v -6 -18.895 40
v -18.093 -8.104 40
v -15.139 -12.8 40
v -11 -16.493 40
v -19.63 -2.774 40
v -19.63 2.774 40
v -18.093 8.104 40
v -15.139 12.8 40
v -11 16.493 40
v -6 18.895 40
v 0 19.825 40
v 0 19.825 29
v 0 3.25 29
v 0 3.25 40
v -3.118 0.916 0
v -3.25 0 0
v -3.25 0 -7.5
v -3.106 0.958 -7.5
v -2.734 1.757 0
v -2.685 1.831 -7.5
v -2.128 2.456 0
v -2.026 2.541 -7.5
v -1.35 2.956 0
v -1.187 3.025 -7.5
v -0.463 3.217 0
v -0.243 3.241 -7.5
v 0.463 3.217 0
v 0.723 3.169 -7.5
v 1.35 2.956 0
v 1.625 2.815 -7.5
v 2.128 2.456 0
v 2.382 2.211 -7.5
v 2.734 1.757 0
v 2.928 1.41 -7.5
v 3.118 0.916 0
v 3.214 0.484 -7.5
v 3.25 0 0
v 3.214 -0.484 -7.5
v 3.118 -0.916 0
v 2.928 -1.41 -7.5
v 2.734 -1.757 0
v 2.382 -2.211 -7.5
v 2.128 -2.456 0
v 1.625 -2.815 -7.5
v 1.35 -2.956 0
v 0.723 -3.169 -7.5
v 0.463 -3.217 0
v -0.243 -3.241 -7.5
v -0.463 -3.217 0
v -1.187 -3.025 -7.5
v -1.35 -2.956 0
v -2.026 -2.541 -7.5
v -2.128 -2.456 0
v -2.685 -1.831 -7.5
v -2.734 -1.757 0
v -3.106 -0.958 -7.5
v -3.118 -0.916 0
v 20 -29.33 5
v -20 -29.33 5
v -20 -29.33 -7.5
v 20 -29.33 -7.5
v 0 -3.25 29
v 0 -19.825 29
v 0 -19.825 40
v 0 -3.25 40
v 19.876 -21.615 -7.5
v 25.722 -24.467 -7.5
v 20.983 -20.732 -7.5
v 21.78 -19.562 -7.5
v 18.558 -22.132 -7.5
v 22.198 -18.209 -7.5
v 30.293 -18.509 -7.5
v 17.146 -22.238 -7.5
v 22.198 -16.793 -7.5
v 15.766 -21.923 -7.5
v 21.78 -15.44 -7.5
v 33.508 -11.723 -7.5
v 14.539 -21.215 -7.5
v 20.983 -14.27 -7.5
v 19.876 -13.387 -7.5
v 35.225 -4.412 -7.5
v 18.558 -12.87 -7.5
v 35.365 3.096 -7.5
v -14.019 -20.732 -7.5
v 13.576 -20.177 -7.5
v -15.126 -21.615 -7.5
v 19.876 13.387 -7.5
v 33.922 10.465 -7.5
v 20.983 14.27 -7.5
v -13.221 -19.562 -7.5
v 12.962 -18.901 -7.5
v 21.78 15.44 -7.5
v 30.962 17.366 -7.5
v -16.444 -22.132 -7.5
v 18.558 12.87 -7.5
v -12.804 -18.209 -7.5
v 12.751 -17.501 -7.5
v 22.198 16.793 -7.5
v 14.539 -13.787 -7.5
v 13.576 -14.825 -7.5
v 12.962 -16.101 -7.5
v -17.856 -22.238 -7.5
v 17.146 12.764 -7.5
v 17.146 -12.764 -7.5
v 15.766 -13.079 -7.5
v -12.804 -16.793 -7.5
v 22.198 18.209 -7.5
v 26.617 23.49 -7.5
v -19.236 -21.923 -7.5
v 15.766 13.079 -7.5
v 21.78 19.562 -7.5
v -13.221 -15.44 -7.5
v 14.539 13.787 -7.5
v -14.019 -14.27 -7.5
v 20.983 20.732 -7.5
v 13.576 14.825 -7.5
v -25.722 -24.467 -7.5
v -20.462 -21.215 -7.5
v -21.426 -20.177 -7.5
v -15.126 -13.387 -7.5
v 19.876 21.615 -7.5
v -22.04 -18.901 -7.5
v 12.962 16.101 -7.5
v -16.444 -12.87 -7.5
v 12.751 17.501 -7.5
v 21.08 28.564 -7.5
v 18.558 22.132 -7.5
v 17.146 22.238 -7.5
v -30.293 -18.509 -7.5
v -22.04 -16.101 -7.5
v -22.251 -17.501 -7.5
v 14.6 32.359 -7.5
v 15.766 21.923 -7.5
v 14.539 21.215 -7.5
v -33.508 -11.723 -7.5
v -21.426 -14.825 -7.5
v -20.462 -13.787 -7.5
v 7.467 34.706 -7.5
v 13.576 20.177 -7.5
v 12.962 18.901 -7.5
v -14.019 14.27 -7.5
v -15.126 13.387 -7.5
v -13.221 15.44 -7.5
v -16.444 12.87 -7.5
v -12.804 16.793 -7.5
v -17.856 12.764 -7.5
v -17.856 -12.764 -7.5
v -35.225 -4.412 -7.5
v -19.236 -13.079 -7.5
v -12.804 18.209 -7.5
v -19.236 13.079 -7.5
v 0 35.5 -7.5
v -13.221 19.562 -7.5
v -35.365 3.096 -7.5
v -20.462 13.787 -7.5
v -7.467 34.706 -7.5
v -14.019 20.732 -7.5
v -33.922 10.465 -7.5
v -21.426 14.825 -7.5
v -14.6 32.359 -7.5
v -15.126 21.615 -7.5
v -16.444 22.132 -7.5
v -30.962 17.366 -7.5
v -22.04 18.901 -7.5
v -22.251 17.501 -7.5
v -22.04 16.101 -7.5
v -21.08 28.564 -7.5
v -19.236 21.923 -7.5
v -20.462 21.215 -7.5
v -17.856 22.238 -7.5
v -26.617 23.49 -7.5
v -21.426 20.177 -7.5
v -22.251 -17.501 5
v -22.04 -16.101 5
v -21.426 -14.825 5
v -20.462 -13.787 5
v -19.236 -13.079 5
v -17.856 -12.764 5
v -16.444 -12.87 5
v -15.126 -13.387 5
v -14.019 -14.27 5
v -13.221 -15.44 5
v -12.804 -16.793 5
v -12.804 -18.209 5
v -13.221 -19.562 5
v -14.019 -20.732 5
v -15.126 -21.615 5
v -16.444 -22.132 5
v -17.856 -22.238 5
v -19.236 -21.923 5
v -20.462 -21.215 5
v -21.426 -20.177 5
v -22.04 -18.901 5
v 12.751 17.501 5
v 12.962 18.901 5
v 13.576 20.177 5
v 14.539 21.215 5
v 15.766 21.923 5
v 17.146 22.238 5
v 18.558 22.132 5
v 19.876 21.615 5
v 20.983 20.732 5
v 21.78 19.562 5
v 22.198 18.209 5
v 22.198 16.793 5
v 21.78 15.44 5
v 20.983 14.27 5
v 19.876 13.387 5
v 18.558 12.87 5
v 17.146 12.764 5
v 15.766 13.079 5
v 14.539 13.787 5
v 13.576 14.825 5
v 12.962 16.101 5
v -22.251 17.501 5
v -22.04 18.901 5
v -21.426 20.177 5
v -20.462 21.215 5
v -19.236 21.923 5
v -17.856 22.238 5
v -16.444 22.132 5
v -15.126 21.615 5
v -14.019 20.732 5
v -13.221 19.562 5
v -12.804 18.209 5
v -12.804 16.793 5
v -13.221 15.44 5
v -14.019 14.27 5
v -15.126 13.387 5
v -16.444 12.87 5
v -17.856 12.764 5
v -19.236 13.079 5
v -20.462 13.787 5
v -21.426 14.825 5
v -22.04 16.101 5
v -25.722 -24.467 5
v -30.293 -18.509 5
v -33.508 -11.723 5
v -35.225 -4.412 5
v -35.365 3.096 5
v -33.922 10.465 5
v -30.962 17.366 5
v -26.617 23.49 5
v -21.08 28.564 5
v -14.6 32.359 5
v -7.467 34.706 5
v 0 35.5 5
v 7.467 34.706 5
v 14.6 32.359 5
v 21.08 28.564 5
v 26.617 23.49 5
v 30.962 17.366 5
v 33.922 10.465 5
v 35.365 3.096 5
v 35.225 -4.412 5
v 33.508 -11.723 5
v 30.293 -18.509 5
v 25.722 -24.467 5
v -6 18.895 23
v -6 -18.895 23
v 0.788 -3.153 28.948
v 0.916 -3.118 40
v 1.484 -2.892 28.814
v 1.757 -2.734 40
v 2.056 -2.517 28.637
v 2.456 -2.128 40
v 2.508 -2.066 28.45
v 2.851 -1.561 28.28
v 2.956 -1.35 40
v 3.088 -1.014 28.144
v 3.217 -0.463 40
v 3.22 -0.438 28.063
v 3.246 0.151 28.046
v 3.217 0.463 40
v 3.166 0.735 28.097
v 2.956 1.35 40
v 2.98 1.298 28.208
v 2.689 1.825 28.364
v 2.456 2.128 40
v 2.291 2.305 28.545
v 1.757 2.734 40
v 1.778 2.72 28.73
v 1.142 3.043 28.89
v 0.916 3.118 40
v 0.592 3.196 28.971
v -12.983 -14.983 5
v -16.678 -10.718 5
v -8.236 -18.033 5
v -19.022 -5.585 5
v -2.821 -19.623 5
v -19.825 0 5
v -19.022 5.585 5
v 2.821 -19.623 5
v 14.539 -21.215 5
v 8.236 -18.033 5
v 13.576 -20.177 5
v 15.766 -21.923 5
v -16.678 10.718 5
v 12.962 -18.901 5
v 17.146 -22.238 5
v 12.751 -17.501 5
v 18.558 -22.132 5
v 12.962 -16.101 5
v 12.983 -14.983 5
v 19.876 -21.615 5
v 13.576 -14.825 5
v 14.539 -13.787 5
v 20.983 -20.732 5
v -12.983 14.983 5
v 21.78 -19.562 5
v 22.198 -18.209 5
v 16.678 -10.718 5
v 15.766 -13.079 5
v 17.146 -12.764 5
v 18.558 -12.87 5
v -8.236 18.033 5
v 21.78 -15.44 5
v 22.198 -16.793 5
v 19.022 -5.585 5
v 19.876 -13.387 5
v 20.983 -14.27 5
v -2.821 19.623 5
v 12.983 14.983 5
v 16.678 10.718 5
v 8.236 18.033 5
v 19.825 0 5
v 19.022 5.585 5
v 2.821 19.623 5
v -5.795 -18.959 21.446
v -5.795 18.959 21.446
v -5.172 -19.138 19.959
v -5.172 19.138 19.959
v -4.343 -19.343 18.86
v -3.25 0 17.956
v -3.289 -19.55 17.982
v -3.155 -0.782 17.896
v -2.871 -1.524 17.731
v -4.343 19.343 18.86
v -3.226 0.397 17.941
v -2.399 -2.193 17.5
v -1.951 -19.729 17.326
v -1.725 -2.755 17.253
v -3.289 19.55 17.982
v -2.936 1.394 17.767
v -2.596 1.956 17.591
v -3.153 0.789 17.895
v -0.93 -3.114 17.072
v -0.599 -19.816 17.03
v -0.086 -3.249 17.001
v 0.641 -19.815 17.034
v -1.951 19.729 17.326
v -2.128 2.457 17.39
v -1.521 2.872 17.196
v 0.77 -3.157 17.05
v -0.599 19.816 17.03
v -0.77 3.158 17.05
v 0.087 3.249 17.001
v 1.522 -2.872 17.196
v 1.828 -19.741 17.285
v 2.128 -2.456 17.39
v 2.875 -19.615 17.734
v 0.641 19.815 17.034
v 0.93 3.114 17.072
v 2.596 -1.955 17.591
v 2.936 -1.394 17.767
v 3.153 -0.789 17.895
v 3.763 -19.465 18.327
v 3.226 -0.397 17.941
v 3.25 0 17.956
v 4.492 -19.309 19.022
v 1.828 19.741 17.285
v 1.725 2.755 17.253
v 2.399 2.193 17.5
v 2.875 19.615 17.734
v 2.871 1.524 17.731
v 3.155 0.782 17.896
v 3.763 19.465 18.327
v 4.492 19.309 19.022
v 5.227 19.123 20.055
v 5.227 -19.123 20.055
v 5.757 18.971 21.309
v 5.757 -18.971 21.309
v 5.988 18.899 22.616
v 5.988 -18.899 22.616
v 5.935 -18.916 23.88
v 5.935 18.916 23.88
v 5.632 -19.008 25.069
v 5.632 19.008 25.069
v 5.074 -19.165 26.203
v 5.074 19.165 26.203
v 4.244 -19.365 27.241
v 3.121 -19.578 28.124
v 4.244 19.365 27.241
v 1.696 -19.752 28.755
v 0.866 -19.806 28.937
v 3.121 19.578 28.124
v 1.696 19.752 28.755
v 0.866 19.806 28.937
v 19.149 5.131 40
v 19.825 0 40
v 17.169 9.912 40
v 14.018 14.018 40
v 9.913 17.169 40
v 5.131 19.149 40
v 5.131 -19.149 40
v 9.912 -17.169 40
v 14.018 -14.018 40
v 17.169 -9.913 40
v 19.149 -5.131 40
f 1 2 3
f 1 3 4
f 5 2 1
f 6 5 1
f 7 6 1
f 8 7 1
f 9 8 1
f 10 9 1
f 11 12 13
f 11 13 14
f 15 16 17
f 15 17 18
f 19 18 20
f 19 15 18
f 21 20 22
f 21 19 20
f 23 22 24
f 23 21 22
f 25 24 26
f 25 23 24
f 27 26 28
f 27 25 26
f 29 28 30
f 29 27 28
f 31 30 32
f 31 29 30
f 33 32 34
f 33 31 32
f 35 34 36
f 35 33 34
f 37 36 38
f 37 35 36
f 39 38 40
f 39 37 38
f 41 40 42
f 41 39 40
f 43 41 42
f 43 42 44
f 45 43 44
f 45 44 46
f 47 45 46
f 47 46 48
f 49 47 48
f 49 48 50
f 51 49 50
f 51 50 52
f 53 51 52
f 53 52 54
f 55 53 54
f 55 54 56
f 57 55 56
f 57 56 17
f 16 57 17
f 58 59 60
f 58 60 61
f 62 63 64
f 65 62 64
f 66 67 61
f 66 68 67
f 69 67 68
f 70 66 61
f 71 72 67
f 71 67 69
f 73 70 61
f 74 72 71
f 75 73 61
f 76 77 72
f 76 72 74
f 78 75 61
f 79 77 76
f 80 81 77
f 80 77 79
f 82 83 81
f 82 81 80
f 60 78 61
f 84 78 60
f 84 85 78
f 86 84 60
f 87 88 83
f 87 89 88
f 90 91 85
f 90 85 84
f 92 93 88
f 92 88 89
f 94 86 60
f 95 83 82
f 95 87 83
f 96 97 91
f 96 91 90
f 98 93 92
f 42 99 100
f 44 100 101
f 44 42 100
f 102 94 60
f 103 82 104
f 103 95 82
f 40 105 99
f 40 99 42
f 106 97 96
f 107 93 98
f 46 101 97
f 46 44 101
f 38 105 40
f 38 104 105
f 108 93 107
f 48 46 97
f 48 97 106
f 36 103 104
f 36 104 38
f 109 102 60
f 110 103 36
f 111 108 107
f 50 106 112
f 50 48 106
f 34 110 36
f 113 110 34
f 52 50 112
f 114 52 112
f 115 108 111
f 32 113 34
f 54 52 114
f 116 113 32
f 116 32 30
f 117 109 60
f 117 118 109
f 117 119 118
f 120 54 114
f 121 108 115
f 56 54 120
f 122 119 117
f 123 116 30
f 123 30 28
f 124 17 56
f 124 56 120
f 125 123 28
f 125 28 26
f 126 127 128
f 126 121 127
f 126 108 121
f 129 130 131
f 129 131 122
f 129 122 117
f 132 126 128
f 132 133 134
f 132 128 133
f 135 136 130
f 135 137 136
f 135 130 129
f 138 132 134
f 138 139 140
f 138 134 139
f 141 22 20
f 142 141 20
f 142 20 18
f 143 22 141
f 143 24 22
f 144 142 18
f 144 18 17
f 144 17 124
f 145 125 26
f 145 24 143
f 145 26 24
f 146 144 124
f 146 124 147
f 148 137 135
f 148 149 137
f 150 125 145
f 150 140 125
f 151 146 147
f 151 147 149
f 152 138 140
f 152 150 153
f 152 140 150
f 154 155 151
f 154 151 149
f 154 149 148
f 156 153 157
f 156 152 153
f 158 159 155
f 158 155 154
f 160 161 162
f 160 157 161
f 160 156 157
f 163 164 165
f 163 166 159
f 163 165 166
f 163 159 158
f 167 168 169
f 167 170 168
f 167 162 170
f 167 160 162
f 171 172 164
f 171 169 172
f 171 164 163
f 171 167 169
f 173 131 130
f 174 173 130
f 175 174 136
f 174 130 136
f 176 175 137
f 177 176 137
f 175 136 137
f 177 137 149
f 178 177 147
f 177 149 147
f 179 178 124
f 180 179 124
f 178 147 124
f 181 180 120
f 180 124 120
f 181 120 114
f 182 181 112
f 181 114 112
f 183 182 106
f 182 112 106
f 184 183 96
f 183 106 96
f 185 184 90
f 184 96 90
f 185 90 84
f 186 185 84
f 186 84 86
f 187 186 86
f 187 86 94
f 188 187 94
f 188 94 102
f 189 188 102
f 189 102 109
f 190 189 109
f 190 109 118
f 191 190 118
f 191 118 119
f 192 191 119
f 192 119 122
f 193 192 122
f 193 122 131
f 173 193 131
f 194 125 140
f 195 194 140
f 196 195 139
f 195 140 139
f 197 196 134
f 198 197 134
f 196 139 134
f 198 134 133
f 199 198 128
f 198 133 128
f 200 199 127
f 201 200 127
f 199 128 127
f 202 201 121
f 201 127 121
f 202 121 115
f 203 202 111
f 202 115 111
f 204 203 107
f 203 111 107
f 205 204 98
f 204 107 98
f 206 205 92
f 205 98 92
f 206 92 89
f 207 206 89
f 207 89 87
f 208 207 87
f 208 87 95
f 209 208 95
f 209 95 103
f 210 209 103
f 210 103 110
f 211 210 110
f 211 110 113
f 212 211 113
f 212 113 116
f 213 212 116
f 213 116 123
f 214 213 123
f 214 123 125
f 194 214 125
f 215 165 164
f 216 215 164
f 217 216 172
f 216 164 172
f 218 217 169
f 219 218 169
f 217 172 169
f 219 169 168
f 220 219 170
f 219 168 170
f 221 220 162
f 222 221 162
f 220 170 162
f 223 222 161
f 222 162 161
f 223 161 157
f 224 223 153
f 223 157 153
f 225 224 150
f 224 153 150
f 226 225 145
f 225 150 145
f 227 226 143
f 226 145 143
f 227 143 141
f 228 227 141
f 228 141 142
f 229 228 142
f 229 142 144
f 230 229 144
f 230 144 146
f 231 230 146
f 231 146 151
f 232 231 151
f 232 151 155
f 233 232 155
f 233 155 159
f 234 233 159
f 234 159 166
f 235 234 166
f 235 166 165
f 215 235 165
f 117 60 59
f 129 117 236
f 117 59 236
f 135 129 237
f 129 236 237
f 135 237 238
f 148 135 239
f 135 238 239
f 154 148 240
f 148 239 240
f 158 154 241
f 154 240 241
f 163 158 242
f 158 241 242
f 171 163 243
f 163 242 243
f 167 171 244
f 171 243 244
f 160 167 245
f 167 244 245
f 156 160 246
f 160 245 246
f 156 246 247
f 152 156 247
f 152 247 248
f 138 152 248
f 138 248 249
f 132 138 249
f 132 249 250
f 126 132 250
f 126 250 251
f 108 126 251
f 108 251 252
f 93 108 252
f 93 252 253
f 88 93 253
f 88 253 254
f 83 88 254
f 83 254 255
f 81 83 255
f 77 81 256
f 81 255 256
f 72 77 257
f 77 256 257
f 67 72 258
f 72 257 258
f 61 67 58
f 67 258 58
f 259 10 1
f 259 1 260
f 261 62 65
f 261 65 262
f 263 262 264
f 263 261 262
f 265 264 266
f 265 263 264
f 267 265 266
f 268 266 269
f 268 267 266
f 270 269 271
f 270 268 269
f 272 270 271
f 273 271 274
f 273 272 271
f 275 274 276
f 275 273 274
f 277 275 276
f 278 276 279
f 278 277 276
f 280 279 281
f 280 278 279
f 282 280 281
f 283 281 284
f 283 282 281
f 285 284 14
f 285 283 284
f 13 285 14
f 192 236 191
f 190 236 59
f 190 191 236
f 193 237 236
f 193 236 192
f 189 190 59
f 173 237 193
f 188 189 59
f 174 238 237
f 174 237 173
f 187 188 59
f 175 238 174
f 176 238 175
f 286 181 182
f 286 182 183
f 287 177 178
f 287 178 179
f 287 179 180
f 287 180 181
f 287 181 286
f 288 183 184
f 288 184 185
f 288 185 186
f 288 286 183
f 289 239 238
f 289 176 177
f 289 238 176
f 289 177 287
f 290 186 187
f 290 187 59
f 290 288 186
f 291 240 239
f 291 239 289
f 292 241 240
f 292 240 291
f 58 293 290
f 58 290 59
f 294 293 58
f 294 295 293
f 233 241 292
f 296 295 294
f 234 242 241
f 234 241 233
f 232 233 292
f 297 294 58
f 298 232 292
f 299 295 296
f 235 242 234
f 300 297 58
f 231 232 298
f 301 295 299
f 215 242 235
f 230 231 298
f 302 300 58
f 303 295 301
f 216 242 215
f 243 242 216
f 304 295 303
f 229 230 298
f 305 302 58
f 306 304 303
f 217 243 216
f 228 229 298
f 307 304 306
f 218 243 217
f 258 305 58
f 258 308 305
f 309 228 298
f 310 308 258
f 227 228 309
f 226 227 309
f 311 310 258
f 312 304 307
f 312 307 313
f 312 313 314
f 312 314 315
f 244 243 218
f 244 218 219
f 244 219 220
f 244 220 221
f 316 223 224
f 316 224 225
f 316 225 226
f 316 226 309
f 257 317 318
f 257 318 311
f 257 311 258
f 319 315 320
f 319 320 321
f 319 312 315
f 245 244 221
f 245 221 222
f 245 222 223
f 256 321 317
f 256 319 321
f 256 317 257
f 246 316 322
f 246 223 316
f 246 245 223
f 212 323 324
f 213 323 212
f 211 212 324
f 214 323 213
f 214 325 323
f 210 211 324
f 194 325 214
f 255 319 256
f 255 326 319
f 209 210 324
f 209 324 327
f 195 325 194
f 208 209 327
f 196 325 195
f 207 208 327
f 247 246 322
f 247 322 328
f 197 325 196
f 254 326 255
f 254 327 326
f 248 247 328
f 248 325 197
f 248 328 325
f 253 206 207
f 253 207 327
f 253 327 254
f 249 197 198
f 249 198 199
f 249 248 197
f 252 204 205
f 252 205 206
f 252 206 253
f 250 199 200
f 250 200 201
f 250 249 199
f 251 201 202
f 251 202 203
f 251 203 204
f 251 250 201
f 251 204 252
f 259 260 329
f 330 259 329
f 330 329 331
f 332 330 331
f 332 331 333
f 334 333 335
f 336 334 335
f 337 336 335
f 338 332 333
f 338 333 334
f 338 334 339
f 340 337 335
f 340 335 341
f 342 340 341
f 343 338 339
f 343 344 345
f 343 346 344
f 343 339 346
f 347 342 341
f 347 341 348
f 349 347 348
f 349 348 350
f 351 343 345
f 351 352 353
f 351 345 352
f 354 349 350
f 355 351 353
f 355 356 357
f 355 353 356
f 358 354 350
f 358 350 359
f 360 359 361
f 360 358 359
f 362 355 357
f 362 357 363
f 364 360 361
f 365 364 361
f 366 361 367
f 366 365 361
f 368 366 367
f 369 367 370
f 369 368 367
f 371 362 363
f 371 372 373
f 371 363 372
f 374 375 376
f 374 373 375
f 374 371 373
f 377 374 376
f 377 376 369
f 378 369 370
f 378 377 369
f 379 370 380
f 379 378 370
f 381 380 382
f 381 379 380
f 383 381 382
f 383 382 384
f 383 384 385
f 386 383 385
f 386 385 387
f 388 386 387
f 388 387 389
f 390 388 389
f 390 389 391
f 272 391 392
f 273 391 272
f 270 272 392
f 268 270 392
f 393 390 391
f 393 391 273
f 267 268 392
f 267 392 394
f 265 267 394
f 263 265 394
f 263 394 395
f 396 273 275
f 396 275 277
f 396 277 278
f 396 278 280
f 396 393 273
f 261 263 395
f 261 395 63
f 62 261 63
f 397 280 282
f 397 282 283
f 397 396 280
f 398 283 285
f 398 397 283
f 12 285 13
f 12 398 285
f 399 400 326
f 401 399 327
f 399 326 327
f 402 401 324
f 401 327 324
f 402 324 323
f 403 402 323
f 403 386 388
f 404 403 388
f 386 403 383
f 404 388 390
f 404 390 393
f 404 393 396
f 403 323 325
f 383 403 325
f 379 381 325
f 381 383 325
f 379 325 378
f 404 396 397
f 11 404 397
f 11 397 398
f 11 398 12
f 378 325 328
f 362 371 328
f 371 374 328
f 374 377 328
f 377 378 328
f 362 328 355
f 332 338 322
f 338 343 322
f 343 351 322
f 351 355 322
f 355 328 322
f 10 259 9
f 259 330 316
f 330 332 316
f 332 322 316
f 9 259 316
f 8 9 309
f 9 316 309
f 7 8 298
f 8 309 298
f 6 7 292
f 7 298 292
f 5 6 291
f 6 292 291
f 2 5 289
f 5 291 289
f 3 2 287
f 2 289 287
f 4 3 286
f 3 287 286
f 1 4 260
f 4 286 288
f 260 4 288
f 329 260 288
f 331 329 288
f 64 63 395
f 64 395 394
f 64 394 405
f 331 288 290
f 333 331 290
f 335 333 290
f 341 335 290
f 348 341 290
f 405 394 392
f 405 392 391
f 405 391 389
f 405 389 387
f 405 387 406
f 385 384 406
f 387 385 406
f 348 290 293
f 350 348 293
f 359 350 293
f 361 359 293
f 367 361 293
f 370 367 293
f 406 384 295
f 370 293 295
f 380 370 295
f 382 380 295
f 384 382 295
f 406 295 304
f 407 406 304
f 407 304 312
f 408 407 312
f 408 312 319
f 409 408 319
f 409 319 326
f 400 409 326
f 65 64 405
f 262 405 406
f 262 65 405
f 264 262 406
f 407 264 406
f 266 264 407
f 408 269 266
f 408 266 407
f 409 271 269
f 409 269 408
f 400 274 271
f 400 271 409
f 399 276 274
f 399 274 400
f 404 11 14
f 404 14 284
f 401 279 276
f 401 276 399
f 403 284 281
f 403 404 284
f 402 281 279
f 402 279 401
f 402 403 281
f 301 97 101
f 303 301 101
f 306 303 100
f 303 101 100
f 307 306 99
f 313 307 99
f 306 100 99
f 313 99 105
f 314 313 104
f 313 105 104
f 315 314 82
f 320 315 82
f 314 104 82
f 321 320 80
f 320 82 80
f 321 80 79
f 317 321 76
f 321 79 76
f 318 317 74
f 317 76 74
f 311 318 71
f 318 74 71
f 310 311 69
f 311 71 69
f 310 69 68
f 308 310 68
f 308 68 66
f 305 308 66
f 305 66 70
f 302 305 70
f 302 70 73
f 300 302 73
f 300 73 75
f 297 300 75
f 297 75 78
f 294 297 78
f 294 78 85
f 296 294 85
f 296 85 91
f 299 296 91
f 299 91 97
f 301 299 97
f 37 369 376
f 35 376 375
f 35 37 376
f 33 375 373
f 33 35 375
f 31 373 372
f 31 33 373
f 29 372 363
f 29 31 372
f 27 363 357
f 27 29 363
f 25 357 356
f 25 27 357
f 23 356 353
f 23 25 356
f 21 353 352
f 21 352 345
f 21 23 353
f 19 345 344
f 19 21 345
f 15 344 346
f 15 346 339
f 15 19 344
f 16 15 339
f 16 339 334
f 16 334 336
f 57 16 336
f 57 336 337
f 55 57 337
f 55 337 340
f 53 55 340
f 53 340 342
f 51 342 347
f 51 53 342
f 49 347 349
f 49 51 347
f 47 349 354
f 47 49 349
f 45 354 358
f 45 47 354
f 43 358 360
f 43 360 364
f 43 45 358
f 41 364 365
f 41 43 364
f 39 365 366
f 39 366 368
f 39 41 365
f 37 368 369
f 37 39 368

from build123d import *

# Parameters (mm, degrees)
CROQUIS1_R                 = 35.5
CROQUIS1_R_2               = 3.25
SALIENTE_EXTRUIR1_DEPTH    = 5
CROQUIS9_R                 = 19.825
CROQUIS9_R_2               = 3.25
SALIENTE_EXTRUIR4_DEPTH    = 35
CORTAR_EXTRUIR4_DEPTH      = 36.5
CORTAR_EXTRUIR4_DEPTH_BACK = 36.5
CROQUIS11_R                = 35.5
CROQUIS11_R_2              = 3.25
SALIENTE_EXTRUIR5_DEPTH    = 7.5
CORTAR_EXTRUIR5_DEPTH      = 7.5
CORTAR_EXTRUIR7_DEPTH      = 13.5
CORTAR_EXTRUIR8_REACH      = 49.5
CROQUIS16_R                = 4.75


with BuildPart() as part:
    # Croquis1 → Saliente-Extruir1 (new body)
    with BuildSketch(Plane.XY):
        Circle(CROQUIS1_R)
        Circle(CROQUIS1_R_2, mode=Mode.SUBTRACT)
    extrude(amount=SALIENTE_EXTRUIR1_DEPTH)

    # Croquis9 → Saliente-Extruir4 (add)
    with BuildSketch(Plane.XY.offset(5)):
        Circle(CROQUIS9_R)
        Circle(CROQUIS9_R_2, mode=Mode.SUBTRACT)
    extrude(amount=SALIENTE_EXTRUIR4_DEPTH)

    # Croquis10 → Cortar-Extruir4 (cut, two sides)
    with BuildSketch(Plane(origin=(0, 0, 0), x_dir=(1, 0, 0), z_dir=(0, 1, 0))) as cortar_extruir4_sk:
        with BuildLine():
            Line((0, -29), (0, -40))
            Line((0, -40), (-6, -40))
            Line((-6, -40), (-6, -23))
            ThreePointArc((-6, -23), (4.242640687, -18.757359313), (0, -29))
        make_face()
    extrude(amount=CORTAR_EXTRUIR4_DEPTH, mode=Mode.SUBTRACT)
    extrude(cortar_extruir4_sk.sketch, amount=-CORTAR_EXTRUIR4_DEPTH_BACK, mode=Mode.SUBTRACT)

    # Croquis11 → Saliente-Extruir5 (add)
    with BuildSketch(Plane(origin=(0, 0, 0), x_dir=(-1, 0, 0), z_dir=(0, 0, -1))):
        Circle(CROQUIS11_R)
        Circle(CROQUIS11_R_2, mode=Mode.SUBTRACT)
    extrude(amount=SALIENTE_EXTRUIR5_DEPTH)

    # Croquis13 → Cortar-Extruir5 (cut)
    with BuildSketch(Plane.XY.offset(5)):
        with BuildLine():
            Line((-20, -29.330018752), (20, -29.330018752))
            ThreePointArc((20, -29.330018752), (0, -35.5), (-20, -29.330018752))
        make_face()
    extrude(amount=-CORTAR_EXTRUIR5_DEPTH, mode=Mode.SUBTRACT)

    # Croquis15 → Cortar-Extruir7 (cut, through all)
    with BuildSketch(Plane.XY.offset(5)):
        with BuildLine():
            Line((20, -29.330018752), (-20, -29.330018752))
            ThreePointArc((-20, -29.330018752), (0, -35.5), (20, -29.330018752))
        make_face()
    extrude(amount=-CORTAR_EXTRUIR7_DEPTH, mode=Mode.SUBTRACT)

    # Croquis16 → Cortar-Extruir8 (cut, up to next)
    with BuildSketch(Plane(origin=(0, 0, -7.5), x_dir=(-1, 0, 0), z_dir=(0, 0, -1)), mode=Mode.PRIVATE) as cortar_extruir8_sk1:
        with Locations((17.500892834, -17.500892834)):
            Circle(CROQUIS16_R)
    cortar_extruir8_tool1 = extrude(cortar_extruir8_sk1.sketch, amount=-CORTAR_EXTRUIR8_REACH, mode=Mode.PRIVATE) & part.part
    add(cortar_extruir8_tool1.solids().sort_by_distance((-17.500893, -17.500893, -7.5))[0], mode=Mode.SUBTRACT)
    # Croquis16 → Cortar-Extruir8 (cut, up to next)
    with BuildSketch(Plane(origin=(0, 0, -7.5), x_dir=(-1, 0, 0), z_dir=(0, 0, -1)), mode=Mode.PRIVATE) as cortar_extruir8_sk2:
        with Locations((-17.500892834, -17.500892834)):
            Circle(CROQUIS16_R)
    cortar_extruir8_tool2 = extrude(cortar_extruir8_sk2.sketch, amount=-CORTAR_EXTRUIR8_REACH, mode=Mode.PRIVATE) & part.part
    add(cortar_extruir8_tool2.solids().sort_by_distance((17.500893, -17.500893, -7.5))[0], mode=Mode.SUBTRACT)
    # Croquis16 → Cortar-Extruir8 (cut, up to next)
    with BuildSketch(Plane(origin=(0, 0, -7.5), x_dir=(-1, 0, 0), z_dir=(0, 0, -1)), mode=Mode.PRIVATE) as cortar_extruir8_sk3:
        with Locations((-17.500892834, 17.500892834)):
            Circle(CROQUIS16_R)
    cortar_extruir8_tool3 = extrude(cortar_extruir8_sk3.sketch, amount=-CORTAR_EXTRUIR8_REACH, mode=Mode.PRIVATE) & part.part
    add(cortar_extruir8_tool3.solids().sort_by_distance((17.500893, 17.500893, -7.5))[0], mode=Mode.SUBTRACT)
    # Croquis16 → Cortar-Extruir8 (cut, up to next)
    with BuildSketch(Plane(origin=(0, 0, -7.5), x_dir=(-1, 0, 0), z_dir=(0, 0, -1)), mode=Mode.PRIVATE) as cortar_extruir8_sk4:
        with Locations((17.500892834, 17.500892834)):
            Circle(CROQUIS16_R)
    cortar_extruir8_tool4 = extrude(cortar_extruir8_sk4.sketch, amount=-CORTAR_EXTRUIR8_REACH, mode=Mode.PRIVATE) & part.part
    add(cortar_extruir8_tool4.solids().sort_by_distance((-17.500893, 17.500893, -7.5))[0], mode=Mode.SUBTRACT)


solid = part.part
